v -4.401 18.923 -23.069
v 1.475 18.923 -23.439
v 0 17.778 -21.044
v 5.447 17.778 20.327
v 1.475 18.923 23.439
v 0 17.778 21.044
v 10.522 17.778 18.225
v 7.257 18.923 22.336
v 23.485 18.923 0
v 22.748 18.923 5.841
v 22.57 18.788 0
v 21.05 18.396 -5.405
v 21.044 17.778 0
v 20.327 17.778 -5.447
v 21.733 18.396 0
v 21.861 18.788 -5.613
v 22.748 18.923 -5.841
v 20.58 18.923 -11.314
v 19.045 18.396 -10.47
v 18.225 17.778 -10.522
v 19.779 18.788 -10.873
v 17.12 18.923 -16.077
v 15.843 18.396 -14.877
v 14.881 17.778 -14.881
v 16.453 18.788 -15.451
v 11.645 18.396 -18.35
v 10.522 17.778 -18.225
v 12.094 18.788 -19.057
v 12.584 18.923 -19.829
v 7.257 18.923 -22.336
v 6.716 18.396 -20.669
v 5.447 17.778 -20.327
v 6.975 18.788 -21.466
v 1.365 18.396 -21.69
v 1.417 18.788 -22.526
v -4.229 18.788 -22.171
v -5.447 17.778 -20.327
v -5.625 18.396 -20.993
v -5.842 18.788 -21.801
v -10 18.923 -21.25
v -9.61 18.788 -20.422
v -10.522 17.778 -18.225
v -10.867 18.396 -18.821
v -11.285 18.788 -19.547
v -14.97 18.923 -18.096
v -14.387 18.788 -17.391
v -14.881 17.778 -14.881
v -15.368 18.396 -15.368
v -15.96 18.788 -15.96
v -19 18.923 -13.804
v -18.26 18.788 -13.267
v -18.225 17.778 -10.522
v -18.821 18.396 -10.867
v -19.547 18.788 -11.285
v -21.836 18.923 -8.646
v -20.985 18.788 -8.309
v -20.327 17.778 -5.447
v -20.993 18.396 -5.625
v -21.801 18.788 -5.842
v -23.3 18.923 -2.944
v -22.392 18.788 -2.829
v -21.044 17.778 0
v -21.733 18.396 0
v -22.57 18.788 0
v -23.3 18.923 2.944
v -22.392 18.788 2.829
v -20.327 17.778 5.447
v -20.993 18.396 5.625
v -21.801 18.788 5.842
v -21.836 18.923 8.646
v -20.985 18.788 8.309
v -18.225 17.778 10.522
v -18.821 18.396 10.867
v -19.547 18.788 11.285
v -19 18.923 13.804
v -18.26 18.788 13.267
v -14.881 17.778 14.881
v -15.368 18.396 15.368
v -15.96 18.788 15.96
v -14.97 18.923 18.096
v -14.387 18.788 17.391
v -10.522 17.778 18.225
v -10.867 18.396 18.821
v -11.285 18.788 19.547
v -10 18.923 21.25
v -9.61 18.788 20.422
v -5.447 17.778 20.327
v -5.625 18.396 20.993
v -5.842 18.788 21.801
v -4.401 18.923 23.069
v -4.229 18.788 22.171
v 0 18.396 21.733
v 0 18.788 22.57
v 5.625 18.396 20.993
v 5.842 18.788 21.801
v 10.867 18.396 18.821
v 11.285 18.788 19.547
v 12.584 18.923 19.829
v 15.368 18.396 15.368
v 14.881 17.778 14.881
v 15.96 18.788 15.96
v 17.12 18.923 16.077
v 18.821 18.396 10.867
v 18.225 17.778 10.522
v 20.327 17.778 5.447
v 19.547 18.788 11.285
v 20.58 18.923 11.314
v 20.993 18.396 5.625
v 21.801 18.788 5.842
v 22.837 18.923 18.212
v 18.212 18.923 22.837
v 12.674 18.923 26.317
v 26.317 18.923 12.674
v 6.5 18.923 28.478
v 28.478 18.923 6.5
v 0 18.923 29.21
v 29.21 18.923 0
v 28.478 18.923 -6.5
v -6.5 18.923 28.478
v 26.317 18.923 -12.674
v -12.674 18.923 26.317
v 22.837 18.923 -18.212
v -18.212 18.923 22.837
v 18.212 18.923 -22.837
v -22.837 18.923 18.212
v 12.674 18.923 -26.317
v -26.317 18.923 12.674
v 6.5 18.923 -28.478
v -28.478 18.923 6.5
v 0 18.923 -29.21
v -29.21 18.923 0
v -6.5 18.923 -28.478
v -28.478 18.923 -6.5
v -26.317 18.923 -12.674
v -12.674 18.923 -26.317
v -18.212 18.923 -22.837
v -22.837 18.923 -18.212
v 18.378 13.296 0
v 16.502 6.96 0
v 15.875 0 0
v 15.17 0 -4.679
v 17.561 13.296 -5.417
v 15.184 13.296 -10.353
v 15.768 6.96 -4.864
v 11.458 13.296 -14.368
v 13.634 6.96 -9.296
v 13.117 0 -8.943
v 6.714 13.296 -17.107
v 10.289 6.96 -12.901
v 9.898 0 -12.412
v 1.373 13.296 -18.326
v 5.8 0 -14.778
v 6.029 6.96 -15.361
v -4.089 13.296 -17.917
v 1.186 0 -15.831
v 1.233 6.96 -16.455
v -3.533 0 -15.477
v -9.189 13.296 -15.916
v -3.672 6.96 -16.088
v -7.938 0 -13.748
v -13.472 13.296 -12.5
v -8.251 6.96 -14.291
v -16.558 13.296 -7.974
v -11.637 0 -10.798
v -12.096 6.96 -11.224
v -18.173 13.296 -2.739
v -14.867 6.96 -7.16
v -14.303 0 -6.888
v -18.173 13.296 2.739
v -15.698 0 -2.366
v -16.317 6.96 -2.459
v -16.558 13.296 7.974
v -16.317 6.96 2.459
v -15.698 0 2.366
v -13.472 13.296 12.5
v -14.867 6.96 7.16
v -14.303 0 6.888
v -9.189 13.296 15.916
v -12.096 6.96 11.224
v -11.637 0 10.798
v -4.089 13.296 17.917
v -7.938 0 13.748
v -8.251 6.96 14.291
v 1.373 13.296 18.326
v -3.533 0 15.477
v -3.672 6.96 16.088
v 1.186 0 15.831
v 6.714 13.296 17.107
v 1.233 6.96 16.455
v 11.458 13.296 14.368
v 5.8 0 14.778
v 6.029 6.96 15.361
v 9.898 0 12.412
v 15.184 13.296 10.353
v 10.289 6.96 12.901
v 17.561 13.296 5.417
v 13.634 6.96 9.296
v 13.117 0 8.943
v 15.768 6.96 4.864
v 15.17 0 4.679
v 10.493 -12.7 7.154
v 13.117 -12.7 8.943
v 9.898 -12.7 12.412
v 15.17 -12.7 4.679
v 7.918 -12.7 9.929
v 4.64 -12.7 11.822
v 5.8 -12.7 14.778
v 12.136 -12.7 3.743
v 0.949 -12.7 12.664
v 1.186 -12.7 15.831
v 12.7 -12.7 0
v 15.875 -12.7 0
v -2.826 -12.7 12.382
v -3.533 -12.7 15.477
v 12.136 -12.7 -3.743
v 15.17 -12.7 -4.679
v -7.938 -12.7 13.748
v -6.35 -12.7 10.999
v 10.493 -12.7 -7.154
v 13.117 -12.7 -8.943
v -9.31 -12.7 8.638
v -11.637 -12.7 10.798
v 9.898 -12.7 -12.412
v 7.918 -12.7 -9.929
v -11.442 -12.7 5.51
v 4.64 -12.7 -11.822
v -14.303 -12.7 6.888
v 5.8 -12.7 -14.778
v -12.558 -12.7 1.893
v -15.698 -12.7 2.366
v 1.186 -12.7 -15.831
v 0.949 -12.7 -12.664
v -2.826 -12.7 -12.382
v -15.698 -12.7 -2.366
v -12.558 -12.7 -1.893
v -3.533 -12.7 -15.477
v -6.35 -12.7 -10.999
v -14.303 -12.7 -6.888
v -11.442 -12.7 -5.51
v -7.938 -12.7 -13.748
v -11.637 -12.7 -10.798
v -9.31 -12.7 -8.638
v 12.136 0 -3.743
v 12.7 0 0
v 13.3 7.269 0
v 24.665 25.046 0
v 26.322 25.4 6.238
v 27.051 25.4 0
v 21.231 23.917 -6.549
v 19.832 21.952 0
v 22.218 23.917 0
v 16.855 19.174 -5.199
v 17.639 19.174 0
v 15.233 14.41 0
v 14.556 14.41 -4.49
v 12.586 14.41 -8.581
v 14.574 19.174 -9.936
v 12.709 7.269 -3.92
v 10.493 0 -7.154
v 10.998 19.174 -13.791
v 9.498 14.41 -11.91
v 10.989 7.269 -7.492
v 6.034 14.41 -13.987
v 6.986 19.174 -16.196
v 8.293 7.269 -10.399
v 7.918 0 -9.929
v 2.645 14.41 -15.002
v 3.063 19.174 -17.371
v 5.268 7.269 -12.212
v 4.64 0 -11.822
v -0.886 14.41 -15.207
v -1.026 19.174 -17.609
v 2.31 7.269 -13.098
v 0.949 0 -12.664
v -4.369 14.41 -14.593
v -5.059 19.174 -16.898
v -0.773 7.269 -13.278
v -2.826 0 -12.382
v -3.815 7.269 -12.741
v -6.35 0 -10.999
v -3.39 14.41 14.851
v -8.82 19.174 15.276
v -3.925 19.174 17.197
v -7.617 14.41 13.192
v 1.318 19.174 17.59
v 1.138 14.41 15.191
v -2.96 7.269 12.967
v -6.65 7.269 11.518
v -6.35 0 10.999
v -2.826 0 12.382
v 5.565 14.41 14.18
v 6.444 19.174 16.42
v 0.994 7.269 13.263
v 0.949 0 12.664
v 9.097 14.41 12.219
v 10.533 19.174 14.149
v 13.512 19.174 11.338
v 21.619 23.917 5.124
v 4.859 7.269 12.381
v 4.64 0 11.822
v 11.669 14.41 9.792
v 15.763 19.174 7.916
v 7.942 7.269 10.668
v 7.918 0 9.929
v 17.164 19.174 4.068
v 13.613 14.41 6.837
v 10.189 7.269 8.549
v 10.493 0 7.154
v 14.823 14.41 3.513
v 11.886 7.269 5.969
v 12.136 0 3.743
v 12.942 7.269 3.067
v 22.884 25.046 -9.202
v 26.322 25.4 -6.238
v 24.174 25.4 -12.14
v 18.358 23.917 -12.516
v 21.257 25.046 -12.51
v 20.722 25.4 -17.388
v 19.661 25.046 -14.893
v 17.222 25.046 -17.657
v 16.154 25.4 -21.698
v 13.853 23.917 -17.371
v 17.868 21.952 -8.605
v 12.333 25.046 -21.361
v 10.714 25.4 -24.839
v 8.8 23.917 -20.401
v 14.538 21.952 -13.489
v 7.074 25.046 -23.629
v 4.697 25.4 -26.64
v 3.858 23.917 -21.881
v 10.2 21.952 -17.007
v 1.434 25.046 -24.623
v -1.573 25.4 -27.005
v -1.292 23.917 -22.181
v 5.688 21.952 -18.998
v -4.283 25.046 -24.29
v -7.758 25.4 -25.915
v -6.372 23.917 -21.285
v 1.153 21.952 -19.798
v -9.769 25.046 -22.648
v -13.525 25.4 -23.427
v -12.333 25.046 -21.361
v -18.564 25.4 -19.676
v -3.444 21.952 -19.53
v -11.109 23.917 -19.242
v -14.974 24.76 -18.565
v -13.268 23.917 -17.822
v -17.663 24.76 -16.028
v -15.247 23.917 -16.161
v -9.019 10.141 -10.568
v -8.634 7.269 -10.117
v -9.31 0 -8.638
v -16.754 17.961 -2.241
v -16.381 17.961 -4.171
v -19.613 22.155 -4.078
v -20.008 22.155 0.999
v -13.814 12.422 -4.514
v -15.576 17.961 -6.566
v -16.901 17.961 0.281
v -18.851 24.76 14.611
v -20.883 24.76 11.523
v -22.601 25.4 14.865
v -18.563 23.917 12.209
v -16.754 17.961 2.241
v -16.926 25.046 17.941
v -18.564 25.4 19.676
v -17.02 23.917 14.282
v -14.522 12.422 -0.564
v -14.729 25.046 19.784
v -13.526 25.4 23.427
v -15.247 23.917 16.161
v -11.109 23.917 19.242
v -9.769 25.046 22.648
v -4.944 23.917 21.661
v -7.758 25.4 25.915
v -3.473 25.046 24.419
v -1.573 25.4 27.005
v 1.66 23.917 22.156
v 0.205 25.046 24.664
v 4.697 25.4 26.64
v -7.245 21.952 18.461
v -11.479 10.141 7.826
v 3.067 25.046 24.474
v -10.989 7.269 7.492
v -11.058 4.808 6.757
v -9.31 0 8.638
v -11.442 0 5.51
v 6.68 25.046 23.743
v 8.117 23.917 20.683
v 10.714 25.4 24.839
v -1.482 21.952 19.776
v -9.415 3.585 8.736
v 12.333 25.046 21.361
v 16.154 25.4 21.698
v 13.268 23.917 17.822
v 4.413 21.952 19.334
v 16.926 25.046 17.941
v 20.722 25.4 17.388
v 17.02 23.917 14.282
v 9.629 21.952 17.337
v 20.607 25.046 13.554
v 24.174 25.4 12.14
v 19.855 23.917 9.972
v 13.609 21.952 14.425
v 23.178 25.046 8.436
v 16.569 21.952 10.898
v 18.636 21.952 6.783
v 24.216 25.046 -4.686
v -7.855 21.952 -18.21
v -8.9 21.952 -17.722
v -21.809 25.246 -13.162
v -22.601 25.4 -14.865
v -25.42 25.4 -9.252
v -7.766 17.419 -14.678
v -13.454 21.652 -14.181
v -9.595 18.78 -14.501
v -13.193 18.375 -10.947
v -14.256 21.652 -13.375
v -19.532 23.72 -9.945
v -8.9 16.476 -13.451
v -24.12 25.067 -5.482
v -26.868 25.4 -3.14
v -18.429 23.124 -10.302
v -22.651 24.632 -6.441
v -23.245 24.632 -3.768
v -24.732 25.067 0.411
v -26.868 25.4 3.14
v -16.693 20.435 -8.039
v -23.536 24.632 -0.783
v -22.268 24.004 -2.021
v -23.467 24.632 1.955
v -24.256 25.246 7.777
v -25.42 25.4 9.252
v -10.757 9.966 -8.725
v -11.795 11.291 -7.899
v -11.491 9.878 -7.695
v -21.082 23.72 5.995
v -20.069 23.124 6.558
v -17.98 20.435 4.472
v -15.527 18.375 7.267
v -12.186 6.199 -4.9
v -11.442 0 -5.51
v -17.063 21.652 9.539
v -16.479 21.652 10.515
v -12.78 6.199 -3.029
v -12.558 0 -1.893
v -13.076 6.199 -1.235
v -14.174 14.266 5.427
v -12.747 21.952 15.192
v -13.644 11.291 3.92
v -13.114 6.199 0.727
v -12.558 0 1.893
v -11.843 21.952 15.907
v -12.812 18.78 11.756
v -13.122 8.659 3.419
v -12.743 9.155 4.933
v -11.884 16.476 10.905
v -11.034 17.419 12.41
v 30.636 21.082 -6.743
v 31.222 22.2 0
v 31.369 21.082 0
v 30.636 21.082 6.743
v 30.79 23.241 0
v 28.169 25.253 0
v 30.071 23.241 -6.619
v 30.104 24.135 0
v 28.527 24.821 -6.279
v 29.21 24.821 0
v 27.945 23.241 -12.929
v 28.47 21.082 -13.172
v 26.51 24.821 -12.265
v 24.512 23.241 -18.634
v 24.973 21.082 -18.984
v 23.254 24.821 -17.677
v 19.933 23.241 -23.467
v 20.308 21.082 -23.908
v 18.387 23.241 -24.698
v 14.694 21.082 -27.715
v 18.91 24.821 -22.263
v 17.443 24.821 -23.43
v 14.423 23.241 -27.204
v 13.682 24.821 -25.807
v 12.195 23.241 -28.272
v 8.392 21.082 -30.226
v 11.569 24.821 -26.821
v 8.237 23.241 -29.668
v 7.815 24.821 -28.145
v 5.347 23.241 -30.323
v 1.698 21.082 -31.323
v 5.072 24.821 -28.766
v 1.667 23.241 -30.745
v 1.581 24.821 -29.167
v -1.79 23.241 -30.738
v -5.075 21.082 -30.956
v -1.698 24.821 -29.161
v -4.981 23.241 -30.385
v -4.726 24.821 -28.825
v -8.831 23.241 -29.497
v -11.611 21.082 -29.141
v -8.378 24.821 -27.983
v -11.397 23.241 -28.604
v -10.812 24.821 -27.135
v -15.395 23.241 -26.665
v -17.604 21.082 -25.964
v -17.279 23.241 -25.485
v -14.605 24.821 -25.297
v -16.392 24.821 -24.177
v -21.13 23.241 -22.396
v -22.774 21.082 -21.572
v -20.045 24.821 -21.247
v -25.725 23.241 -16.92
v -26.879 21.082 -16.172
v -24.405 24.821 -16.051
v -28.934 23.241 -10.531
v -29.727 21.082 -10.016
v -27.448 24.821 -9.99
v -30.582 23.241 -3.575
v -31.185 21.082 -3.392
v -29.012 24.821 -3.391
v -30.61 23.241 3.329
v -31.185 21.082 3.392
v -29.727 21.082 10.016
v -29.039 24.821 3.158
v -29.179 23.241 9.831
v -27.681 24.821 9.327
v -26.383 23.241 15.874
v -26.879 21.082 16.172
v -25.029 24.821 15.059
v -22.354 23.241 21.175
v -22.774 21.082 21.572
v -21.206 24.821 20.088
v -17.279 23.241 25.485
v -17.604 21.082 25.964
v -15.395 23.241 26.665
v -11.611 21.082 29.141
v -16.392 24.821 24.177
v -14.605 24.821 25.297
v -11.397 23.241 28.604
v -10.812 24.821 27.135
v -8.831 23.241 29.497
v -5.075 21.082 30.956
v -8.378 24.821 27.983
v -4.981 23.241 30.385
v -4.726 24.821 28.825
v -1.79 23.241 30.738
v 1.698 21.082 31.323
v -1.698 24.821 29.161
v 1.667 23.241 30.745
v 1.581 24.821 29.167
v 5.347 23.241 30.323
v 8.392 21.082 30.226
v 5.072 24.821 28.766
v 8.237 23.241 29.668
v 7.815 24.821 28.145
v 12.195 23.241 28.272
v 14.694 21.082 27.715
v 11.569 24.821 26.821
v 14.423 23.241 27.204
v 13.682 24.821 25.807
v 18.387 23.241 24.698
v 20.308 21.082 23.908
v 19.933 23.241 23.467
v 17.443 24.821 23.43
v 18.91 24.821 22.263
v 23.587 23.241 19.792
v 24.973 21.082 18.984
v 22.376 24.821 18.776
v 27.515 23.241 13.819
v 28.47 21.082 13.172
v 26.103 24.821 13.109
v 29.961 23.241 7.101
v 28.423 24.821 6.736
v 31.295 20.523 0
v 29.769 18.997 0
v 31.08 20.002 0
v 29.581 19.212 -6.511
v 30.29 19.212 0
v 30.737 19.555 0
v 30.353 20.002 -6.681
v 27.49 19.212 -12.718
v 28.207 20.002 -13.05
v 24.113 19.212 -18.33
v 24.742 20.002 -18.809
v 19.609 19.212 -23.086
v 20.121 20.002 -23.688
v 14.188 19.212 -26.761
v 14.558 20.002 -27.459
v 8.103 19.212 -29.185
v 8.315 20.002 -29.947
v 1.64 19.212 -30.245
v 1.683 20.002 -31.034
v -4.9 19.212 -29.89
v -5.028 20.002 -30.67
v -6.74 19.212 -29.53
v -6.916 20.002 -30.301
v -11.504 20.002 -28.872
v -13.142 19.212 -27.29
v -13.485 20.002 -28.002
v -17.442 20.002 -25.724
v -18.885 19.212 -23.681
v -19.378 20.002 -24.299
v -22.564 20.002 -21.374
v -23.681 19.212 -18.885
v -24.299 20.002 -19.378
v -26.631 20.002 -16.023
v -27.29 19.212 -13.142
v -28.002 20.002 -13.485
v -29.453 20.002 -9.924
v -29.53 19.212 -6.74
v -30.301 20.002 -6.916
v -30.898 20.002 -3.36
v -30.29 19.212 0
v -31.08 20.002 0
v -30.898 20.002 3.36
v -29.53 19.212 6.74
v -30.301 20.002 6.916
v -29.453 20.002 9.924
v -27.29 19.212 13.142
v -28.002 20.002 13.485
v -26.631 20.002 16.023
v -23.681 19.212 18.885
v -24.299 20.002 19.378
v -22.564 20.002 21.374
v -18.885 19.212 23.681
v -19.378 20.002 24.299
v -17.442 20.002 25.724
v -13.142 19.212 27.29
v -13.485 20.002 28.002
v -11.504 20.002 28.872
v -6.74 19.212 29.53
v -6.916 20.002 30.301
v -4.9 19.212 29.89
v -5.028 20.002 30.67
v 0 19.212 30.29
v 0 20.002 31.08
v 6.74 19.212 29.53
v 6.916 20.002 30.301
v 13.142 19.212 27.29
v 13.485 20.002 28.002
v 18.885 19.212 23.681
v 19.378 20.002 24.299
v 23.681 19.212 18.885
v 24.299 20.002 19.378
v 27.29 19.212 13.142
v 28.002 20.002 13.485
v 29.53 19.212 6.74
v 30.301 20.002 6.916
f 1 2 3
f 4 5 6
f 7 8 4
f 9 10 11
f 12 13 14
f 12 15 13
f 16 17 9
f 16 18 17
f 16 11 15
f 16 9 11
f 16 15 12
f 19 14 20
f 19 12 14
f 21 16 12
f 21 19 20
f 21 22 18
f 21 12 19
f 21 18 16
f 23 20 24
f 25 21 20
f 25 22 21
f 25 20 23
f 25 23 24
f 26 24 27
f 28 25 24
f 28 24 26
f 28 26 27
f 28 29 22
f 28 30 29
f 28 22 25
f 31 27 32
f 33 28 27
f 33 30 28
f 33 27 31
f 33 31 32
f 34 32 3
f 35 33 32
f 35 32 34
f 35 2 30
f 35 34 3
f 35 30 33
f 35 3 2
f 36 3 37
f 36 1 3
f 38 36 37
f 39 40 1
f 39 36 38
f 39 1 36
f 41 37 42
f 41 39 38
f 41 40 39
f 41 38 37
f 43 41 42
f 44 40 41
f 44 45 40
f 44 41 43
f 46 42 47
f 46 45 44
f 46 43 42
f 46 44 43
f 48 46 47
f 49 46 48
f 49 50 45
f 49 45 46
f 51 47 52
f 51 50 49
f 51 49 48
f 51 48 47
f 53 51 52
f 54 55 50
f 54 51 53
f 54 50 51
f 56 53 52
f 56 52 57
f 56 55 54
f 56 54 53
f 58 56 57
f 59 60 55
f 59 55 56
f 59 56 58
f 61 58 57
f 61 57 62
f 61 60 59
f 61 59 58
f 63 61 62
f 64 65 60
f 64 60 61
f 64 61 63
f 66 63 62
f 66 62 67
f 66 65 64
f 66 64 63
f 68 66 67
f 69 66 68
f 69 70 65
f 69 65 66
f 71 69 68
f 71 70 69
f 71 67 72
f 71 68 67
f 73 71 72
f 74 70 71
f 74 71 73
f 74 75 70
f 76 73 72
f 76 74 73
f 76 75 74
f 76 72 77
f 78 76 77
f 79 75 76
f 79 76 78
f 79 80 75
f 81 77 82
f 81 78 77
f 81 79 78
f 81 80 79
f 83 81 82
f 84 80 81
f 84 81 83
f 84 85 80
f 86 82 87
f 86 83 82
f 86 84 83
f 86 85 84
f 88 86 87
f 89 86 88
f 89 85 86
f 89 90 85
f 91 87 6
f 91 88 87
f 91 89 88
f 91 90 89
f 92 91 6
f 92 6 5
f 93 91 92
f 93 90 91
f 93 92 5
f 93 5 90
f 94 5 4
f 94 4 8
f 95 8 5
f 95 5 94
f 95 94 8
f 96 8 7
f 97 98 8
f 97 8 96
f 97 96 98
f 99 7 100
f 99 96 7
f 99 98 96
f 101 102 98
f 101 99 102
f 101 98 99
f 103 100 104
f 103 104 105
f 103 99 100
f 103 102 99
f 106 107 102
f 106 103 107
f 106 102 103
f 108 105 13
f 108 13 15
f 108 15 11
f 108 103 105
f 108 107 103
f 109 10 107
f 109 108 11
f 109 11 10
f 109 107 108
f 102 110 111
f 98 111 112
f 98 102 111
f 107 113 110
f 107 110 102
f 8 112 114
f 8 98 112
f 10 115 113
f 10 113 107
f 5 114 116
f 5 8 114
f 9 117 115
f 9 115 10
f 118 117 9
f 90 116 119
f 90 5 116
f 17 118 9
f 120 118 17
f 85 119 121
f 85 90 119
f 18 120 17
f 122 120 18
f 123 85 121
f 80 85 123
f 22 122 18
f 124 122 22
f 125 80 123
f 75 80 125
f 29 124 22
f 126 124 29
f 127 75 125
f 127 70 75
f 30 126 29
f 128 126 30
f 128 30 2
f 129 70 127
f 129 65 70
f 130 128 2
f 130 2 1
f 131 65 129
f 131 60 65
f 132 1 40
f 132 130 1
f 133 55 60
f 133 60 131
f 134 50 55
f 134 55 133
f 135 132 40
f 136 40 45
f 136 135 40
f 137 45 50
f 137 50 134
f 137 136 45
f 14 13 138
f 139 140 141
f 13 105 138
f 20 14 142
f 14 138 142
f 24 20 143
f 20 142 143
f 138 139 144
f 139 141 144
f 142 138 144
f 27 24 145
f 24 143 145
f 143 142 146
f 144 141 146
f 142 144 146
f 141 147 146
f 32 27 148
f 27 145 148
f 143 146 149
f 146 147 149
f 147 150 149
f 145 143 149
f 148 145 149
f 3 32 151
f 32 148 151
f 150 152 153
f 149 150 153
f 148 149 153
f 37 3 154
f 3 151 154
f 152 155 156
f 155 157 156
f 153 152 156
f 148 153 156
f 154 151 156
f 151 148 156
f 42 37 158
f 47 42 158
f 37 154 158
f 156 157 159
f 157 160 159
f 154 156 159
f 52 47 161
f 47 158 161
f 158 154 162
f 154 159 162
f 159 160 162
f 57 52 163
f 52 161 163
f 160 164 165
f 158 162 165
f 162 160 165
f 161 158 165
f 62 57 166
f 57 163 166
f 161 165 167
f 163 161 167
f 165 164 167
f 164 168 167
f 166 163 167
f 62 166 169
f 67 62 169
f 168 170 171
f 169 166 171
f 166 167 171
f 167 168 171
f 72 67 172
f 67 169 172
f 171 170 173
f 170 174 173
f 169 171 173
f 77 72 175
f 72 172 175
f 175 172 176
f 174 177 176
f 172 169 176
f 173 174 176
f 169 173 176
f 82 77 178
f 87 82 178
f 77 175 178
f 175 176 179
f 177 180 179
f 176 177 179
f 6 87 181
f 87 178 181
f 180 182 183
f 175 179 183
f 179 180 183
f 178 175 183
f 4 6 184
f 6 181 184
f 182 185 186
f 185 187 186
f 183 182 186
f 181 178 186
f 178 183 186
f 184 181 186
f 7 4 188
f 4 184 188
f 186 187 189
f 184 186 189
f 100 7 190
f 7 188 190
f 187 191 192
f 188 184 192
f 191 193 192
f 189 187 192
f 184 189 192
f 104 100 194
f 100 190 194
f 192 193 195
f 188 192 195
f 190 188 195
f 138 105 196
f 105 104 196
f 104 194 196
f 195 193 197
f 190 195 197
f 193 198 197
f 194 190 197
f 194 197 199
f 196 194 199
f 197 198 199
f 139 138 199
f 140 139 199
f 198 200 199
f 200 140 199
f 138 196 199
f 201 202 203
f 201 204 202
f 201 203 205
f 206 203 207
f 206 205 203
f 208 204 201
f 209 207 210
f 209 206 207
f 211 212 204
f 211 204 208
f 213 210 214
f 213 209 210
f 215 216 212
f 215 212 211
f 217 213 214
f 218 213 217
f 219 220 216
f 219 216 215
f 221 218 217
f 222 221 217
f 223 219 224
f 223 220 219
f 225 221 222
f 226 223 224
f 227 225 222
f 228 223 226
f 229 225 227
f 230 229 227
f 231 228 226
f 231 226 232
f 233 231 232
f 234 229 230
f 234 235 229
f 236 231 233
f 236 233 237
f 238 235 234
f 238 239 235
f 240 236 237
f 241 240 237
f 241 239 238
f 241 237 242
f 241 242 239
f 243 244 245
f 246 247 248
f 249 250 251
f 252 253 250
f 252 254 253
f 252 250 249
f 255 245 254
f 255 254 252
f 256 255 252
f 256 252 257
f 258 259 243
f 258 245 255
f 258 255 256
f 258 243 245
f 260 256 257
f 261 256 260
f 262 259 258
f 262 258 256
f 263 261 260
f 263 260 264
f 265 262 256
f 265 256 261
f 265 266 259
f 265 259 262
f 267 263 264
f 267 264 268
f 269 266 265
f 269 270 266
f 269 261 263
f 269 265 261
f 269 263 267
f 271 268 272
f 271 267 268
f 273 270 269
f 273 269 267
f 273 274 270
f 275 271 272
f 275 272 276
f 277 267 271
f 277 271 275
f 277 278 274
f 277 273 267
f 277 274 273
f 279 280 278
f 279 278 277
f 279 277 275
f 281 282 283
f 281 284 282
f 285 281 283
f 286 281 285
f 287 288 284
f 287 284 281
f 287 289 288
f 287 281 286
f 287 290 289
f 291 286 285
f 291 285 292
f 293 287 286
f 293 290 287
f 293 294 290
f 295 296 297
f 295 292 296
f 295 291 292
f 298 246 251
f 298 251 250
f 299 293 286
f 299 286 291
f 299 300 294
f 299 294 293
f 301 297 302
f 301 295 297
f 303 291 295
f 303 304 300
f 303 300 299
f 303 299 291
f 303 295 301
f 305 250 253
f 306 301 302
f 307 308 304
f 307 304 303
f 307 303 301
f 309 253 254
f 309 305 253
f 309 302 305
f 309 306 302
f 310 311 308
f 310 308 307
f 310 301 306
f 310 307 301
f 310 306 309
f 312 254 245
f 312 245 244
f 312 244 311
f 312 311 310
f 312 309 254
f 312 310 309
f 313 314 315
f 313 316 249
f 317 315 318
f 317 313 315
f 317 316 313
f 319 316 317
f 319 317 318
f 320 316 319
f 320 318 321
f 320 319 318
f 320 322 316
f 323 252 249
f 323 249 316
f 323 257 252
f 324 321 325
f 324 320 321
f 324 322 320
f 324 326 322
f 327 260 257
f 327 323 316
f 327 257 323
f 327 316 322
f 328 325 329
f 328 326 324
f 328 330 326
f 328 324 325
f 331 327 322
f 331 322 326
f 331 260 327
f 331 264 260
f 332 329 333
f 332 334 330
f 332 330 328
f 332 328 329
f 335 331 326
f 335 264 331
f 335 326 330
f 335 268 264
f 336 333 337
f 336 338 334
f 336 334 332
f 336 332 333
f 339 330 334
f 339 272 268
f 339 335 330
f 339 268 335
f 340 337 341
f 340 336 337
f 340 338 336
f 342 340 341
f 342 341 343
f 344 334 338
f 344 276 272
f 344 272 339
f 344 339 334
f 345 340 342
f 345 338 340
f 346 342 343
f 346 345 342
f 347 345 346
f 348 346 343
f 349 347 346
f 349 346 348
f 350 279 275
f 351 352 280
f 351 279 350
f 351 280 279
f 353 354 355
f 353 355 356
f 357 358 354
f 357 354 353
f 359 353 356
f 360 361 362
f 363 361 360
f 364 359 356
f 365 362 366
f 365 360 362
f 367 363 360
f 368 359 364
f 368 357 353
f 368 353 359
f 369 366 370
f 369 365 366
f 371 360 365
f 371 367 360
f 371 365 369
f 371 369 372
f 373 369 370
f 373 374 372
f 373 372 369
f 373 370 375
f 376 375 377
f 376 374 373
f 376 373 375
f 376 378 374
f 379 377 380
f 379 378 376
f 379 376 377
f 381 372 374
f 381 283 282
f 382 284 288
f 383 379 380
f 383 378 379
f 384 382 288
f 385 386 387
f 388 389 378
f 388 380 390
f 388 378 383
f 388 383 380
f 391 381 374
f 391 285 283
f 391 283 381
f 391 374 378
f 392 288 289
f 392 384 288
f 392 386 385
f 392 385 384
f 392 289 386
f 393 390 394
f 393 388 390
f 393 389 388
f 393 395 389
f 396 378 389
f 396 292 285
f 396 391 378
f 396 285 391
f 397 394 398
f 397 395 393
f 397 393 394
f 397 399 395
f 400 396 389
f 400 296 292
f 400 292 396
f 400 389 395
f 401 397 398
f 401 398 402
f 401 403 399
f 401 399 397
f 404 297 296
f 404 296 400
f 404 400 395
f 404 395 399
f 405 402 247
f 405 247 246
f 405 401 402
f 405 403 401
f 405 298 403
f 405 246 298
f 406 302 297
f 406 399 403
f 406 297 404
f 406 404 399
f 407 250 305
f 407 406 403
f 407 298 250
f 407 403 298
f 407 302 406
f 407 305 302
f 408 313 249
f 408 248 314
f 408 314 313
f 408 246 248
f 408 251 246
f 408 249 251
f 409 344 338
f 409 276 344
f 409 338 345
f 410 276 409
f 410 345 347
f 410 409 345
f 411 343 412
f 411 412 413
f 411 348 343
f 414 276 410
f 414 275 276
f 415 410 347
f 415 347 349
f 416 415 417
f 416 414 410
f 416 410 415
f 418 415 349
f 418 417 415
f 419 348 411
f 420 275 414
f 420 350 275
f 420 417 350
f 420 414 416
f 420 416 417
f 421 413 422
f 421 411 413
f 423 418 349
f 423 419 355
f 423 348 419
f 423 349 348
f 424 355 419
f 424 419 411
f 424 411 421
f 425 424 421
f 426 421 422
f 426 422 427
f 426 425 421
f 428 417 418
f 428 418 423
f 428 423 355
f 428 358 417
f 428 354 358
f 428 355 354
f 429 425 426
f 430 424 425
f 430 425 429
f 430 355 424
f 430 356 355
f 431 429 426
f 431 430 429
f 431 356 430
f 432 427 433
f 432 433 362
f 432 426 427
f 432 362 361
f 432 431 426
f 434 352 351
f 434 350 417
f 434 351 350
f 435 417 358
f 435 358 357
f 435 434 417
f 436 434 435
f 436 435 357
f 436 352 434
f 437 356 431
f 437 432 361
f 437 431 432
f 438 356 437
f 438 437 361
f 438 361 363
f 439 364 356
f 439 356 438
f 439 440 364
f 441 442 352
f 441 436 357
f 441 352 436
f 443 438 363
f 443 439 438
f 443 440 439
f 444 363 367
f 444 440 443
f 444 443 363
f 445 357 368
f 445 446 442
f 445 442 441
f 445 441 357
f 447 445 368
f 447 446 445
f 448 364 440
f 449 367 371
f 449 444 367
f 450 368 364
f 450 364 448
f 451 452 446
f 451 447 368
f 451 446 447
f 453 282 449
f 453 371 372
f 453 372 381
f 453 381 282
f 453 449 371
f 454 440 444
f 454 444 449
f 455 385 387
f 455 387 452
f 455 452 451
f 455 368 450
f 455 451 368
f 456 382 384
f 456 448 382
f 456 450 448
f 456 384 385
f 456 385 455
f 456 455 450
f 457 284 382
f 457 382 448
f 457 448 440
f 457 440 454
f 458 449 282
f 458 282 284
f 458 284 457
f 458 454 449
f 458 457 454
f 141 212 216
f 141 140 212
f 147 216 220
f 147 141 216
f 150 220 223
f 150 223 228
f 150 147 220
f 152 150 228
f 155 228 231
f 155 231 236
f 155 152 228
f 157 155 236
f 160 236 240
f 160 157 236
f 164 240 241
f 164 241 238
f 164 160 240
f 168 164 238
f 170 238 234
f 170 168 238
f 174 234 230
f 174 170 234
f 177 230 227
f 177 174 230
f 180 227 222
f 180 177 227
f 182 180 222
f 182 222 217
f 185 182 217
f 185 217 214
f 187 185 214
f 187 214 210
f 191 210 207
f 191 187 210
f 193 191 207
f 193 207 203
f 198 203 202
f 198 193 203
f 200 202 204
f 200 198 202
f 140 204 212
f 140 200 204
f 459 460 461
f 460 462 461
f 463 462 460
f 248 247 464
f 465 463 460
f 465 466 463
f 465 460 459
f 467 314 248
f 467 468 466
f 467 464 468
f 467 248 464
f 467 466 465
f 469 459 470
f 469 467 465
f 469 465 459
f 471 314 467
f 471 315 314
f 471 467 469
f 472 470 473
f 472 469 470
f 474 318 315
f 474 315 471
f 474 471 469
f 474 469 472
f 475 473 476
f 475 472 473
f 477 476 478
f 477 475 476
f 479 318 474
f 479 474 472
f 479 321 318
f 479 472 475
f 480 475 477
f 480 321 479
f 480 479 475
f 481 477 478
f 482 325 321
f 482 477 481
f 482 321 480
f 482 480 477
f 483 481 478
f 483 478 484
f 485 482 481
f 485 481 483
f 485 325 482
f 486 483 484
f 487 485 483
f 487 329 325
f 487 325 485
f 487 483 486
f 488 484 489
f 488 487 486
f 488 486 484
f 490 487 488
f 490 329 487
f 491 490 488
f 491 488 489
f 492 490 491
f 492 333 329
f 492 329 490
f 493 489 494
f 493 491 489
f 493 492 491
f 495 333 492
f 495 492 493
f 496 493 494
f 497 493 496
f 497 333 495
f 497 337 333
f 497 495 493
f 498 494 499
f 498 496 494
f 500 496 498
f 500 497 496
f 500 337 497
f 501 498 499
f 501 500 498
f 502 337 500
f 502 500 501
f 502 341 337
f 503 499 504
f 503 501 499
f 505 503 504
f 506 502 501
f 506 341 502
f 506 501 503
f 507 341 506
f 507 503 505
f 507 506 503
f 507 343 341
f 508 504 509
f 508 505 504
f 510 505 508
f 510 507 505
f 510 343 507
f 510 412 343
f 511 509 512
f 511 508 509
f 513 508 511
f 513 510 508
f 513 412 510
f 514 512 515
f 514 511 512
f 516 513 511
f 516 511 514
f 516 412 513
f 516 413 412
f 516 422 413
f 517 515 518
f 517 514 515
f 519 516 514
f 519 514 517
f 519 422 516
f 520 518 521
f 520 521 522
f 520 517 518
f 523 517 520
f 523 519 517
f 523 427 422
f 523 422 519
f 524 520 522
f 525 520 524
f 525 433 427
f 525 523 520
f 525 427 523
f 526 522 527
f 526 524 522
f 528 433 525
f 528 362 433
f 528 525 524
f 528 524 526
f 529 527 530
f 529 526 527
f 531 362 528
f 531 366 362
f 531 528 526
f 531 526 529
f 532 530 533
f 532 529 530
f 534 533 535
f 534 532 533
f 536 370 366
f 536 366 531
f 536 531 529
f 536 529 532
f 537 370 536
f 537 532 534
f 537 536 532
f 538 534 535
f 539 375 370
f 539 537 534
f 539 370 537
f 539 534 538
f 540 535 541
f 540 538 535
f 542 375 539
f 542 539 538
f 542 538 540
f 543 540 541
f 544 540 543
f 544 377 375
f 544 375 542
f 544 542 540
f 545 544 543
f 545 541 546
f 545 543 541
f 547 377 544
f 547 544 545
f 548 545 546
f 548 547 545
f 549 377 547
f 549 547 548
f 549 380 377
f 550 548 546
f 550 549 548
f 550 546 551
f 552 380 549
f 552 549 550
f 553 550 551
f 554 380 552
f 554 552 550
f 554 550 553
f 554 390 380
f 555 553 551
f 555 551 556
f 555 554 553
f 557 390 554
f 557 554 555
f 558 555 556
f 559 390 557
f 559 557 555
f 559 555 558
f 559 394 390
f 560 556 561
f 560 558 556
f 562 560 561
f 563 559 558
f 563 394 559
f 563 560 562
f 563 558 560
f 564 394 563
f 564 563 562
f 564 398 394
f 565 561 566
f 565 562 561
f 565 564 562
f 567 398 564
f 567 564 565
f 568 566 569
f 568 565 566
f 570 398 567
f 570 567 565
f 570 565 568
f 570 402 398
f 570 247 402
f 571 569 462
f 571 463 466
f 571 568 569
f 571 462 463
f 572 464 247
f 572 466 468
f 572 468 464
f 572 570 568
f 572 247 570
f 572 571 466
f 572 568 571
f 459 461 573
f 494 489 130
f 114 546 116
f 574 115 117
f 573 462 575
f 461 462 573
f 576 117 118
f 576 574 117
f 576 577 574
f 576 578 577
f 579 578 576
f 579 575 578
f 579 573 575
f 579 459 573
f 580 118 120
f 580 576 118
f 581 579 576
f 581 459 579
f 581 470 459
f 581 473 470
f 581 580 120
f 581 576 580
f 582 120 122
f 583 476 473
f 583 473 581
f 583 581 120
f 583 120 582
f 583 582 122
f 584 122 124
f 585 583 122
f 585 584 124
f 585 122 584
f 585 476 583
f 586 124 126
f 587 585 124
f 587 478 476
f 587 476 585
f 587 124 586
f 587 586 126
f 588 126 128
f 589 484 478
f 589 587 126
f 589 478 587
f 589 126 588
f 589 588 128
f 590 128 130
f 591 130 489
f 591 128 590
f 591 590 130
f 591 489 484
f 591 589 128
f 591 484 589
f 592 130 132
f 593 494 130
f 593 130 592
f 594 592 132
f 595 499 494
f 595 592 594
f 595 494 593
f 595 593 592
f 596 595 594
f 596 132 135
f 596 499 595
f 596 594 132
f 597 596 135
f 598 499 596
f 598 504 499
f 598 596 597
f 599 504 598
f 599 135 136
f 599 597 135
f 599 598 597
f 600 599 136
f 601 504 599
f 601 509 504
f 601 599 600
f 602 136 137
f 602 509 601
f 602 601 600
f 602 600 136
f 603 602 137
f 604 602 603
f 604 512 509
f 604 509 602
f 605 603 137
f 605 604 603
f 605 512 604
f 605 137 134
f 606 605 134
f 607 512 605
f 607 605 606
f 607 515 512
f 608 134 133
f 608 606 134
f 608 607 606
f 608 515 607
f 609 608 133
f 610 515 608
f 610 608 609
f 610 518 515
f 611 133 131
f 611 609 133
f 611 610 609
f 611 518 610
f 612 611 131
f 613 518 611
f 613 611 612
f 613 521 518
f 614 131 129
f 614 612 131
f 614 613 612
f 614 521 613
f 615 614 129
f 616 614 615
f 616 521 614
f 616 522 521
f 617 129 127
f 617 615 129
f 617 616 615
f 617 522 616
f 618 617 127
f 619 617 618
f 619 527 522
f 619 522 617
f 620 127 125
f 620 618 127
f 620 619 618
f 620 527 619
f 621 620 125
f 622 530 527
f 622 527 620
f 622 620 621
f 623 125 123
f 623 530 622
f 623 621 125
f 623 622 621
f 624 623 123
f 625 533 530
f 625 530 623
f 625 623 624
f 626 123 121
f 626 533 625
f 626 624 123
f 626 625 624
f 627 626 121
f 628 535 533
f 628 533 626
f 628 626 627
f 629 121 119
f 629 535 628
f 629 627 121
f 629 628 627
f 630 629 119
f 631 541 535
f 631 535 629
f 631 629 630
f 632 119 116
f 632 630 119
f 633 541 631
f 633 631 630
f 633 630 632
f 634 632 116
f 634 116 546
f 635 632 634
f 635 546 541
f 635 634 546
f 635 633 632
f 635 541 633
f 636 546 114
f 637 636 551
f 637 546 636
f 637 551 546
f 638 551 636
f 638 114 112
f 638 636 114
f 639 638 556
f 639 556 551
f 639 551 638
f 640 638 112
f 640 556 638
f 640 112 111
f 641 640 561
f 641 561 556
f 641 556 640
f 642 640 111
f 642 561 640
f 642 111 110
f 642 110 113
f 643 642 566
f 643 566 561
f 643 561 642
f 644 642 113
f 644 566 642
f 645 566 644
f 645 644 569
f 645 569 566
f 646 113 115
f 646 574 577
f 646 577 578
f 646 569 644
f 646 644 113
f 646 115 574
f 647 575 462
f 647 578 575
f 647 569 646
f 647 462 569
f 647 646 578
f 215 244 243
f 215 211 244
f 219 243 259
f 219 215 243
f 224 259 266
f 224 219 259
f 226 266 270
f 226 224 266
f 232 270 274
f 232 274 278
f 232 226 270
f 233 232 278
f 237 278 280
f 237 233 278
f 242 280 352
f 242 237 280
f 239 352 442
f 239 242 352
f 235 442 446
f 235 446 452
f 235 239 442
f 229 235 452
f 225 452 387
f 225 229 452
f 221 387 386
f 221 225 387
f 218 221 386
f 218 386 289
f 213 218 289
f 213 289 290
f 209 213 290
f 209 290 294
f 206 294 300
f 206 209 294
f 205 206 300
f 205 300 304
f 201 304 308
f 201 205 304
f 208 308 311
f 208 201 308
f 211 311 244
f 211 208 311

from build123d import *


with BuildPart() as f1:
    # F0 (on Top) → F1 (revolve)
    with BuildSketch(Plane.XY):
        with BuildLine():
            ThreePointArc((29.21, 18.923), (30.7366435406, 19.5553564594), (31.369, 21.082))
            ThreePointArc((31.369, 21.082), (30.1042870812, 24.1352870812), (27.051, 25.4))
            add(Edge.make_bspline(
                [(27.051, 25.4), (12.7, 25.4), (12.7, 0)],
                knots=[0, 0, 0, 1.5707963268, 1.5707963268, 1.5707963268], degree=2, weights=[1, 0.7071067812, 1]))
            Line((12.7, 0), (12.7, -12.7))
            Line((12.7, -12.7), (15.875, -12.7))
            Line((15.875, -12.7), (15.875, 0))
            add(Edge.make_bspline(
                [(21.0444702233, 17.778371929), (15.875, 11.5635524722), (15.875, 0)],
                knots=[0.5674091227, 0.5674091227, 0.5674091227, 1.5707963268, 1.5707963268, 1.5707963268], degree=2, weights=[1, 0.8767693476, 1]))
            ThreePointArc((21.0444702233, 17.778371929), (22.1374182752, 18.6226352703), (23.485415702, 18.923))
            Line((23.485415702, 18.923), (29.21, 18.923))
        make_face()
    revolve(axis=Axis((0, 35.1700206795, 0), (0, 1, 0)))


solid = f1.part
